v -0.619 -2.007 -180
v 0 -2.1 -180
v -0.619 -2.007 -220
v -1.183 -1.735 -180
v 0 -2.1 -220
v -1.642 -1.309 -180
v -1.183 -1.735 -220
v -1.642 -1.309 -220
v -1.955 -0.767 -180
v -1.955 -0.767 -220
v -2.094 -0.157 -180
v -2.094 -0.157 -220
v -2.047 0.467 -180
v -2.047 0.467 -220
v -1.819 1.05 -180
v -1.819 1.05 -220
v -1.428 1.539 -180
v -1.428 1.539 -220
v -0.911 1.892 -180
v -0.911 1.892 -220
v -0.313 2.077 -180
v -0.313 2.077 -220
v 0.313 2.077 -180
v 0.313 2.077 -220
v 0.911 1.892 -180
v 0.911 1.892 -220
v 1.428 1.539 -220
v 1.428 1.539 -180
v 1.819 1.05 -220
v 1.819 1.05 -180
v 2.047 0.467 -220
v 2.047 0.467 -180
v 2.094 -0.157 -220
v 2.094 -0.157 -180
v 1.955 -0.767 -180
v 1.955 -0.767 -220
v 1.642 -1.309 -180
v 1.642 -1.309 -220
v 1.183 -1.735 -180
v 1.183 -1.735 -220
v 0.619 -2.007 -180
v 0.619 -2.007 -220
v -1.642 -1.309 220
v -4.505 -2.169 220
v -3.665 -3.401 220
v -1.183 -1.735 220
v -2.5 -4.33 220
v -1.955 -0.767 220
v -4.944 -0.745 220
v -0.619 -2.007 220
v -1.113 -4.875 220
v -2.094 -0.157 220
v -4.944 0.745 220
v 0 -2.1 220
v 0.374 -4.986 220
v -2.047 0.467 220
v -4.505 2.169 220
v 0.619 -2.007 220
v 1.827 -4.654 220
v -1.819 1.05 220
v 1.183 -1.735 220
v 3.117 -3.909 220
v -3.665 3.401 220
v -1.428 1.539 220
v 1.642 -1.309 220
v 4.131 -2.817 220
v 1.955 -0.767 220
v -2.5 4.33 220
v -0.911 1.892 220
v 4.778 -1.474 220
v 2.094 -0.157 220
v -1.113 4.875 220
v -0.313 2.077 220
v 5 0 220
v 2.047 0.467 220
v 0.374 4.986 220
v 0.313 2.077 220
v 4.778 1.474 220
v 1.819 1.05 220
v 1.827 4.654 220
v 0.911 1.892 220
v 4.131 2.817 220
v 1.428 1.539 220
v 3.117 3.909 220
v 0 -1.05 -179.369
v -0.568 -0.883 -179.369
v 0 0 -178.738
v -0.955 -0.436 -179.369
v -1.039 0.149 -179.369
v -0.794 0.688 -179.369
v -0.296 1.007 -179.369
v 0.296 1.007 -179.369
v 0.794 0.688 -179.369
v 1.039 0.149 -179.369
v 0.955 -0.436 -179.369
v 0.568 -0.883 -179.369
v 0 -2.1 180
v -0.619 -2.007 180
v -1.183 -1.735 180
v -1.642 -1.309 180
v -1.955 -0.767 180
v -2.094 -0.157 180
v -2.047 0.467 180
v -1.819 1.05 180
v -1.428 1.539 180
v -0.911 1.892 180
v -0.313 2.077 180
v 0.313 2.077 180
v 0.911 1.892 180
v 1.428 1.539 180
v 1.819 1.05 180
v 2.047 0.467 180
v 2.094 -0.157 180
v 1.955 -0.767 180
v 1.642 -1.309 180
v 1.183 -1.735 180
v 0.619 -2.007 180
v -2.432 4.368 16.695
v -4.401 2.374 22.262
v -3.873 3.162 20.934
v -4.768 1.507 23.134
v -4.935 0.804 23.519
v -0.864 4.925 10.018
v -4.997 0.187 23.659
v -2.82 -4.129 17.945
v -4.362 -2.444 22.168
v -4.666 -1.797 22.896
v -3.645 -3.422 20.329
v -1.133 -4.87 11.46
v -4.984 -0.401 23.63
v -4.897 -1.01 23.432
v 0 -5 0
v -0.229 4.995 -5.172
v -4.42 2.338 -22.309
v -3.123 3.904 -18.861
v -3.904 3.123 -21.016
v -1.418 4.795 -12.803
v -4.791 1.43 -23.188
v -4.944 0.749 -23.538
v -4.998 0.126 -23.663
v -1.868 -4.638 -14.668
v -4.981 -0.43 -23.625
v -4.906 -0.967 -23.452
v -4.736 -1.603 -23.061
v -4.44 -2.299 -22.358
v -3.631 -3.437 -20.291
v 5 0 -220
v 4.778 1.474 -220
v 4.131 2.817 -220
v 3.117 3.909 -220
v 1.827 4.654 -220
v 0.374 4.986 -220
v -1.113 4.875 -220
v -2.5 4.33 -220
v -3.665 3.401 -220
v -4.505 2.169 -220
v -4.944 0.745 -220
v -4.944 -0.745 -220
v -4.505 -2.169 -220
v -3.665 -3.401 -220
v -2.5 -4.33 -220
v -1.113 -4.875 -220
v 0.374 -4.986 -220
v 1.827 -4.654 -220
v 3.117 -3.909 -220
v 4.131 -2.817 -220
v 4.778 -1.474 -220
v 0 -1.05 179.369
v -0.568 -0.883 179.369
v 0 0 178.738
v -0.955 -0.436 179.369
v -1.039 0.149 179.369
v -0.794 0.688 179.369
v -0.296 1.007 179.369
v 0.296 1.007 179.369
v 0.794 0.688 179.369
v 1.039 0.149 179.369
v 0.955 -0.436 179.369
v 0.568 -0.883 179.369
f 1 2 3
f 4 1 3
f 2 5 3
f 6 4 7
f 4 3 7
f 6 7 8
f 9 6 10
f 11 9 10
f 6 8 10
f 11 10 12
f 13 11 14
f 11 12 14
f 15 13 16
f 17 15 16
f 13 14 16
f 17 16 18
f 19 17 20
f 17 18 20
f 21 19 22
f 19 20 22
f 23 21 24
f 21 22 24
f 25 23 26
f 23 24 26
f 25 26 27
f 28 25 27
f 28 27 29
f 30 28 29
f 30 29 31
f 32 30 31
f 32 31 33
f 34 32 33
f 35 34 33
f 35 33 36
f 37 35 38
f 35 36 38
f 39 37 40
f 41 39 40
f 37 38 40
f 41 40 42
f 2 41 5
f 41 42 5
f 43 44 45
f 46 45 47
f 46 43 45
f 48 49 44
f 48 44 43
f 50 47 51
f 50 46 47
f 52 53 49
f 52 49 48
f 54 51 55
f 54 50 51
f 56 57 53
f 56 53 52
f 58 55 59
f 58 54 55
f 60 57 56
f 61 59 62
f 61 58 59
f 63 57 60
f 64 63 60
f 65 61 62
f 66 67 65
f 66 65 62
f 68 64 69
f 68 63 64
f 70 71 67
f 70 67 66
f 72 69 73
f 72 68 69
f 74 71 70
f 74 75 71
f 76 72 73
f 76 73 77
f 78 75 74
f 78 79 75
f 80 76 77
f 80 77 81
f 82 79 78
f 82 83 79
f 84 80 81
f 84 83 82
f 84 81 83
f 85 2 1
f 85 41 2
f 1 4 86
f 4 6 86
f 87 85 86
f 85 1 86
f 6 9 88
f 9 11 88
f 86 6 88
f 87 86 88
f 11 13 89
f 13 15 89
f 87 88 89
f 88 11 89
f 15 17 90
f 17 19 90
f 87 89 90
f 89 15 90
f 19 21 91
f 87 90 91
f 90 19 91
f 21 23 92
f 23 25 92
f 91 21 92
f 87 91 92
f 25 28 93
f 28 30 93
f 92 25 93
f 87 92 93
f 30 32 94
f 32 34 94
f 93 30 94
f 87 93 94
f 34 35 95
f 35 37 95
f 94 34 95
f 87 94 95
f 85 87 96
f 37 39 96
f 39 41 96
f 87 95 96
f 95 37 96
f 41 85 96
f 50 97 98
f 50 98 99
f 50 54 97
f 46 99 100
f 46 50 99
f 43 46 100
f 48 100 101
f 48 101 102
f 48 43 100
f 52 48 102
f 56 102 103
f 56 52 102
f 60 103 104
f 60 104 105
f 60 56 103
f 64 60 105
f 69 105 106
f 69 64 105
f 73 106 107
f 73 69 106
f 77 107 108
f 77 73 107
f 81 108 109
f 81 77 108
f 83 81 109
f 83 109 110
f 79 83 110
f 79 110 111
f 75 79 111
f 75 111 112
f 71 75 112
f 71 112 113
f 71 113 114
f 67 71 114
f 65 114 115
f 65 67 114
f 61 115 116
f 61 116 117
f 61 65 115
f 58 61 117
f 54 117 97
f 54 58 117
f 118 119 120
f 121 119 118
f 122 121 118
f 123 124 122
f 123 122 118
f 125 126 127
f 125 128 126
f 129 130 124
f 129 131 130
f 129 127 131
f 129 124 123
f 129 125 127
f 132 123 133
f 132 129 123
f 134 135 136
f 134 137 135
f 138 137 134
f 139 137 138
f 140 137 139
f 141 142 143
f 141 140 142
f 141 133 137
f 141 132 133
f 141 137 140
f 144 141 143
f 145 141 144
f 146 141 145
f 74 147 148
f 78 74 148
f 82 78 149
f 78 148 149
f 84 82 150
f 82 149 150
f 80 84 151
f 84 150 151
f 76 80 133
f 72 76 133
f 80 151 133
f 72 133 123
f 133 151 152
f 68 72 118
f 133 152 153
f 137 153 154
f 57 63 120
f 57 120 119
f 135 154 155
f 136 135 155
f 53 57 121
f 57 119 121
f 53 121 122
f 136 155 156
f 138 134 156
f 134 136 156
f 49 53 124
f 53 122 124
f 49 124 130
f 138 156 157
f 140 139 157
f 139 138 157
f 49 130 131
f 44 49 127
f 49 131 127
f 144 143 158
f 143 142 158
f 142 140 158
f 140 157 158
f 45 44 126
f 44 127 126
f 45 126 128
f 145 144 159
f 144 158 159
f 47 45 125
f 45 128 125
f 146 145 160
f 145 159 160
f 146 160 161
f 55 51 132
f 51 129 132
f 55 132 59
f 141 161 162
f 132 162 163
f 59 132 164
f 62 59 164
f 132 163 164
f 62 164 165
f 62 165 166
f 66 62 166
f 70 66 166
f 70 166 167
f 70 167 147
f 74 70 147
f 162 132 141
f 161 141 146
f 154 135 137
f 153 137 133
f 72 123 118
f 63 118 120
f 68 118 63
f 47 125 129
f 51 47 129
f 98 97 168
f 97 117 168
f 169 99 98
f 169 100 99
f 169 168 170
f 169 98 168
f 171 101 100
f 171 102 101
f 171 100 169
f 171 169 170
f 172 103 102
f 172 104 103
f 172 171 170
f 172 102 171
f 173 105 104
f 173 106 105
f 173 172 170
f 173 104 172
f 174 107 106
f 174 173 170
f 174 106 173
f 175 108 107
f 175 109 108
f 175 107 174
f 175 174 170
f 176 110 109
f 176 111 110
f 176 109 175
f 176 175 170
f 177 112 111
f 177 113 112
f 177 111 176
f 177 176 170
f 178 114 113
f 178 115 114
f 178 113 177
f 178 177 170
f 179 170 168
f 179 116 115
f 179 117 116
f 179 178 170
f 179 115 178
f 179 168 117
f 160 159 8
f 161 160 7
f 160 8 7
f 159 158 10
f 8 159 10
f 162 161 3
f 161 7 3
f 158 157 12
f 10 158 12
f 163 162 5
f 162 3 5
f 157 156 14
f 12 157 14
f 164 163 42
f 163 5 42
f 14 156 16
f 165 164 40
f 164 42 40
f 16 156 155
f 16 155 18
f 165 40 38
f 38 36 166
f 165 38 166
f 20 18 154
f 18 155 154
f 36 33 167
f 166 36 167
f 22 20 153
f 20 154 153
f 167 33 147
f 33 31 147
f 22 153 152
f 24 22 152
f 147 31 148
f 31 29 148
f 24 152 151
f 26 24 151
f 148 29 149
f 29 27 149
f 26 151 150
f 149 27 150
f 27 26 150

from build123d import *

# Parameters (mm, degrees)
SALIENTE_EXTRUIR1_DEPTH      = 220
SALIENTE_EXTRUIR1_DEPTH_BACK = 220
CROQUIS1_R                   = 5
CORTAR_EXTRUIR1_DEPTH        = 221.113607031
CORTAR_EXTRUIR1_DEPTH_BACK   = 221.113607031
CROQUIS6_R                   = 58.510219283


with BuildPart() as part:
    # Croquis1 → Saliente-Extruir1 (new, two sides: drawn at the far end of the back side and taken through both)
    with BuildSketch(Plane.XY.offset(-SALIENTE_EXTRUIR1_DEPTH_BACK)):
        Circle(CROQUIS1_R)
    extrude(amount=SALIENTE_EXTRUIR1_DEPTH + SALIENTE_EXTRUIR1_DEPTH_BACK)

    # Croquis5 → Perforador para roscar para macho de roscar para M5x0.81 (revolve, cut)
    with BuildSketch(Plane(origin=(0, 0, 220), x_dir=(0, -1, 0), z_dir=(1, 0, 0))):
        Polygon((0, 0), (0, 41.2618073), (2.1, 40), (2.1, 0), align=None)
    perforador_para_roscar_para_macho_de_ros = revolve(axis=Axis((0, 0, 226.35), (0, 0, -1)), mode=Mode.SUBTRACT)

    # Simetría2: Perforador para roscar para macho de roscar para M5x0.81 across plane
    add(perforador_para_roscar_para_macho_de_ros.mirror(Plane.XY), mode=Mode.SUBTRACT)

    # Croquis6 → Cortar-Extruir1 (cut, two sides: drawn at the far end of the back side and taken through both)
    with BuildSketch(Plane(origin=(0, 0, 0), x_dir=(1, 0, 0), z_dir=(0, 1, 0)).offset(-CORTAR_EXTRUIR1_DEPTH_BACK)):
        with Locations((-58.510219283, 0)):
            Circle(CROQUIS6_R)
    extrude(amount=CORTAR_EXTRUIR1_DEPTH + CORTAR_EXTRUIR1_DEPTH_BACK, mode=Mode.SUBTRACT)


solid = part.part
